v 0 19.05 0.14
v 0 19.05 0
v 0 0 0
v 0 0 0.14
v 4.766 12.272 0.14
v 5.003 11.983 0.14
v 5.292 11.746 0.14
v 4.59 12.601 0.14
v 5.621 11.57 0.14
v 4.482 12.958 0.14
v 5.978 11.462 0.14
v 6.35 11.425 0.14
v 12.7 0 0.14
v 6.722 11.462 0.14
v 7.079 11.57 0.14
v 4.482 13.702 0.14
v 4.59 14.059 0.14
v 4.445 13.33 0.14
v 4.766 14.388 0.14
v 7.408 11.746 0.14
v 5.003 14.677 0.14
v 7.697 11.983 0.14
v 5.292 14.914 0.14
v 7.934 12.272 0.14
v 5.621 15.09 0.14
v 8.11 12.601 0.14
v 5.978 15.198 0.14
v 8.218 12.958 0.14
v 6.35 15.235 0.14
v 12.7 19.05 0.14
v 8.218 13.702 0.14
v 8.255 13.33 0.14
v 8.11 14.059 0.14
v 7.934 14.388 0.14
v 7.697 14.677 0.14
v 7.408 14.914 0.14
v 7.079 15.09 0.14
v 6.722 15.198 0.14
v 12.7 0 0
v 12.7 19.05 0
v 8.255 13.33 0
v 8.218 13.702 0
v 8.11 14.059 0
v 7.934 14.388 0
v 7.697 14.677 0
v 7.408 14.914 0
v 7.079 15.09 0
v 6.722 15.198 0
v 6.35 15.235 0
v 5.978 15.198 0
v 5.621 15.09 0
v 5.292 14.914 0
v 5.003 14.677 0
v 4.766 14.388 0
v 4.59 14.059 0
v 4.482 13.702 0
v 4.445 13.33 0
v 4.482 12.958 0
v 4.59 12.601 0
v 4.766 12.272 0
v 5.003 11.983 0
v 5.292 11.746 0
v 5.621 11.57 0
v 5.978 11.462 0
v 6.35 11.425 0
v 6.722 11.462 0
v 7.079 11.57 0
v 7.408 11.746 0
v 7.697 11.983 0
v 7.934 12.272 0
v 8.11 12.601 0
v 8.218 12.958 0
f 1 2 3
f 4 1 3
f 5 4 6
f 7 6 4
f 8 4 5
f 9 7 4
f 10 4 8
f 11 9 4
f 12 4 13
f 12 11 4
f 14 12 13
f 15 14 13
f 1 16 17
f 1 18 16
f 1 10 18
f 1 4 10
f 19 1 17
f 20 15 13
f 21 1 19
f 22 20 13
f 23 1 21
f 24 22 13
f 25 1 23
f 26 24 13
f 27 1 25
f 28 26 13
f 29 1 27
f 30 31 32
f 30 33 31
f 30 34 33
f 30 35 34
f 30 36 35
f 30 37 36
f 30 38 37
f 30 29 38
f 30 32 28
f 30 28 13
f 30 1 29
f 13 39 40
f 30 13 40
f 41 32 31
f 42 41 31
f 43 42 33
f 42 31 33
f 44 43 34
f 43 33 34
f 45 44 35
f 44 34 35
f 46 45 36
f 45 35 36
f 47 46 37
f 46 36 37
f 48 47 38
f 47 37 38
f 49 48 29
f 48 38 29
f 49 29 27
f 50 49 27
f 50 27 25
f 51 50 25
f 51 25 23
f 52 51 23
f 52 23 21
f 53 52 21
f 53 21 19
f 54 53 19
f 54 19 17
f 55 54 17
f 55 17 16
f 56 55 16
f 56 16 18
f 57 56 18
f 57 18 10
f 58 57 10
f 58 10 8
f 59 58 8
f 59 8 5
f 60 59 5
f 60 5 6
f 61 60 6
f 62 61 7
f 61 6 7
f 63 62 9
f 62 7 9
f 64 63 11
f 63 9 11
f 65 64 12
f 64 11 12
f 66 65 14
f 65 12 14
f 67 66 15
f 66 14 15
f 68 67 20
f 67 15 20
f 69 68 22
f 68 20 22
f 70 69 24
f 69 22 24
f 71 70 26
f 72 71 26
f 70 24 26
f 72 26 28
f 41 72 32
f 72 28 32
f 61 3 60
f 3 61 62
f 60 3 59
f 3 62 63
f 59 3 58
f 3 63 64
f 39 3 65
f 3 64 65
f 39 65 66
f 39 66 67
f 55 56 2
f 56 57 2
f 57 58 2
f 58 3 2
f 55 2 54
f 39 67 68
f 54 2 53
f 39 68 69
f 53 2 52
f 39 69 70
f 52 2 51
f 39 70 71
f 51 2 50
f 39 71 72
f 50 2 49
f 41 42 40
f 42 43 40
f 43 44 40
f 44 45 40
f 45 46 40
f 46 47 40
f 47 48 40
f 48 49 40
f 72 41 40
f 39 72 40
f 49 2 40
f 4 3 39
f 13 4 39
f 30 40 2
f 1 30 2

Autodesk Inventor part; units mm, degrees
ref_plane "YZ Plane" through (0, 0, 0) normal (1, 0, 0) x (0, 1, 0)
ref_plane "XZ Plane" through (0, 0, 0) normal (0, 1, 0) x (-1, 0, 0)
ref_plane "XY Plane" through (0, 0, 0) normal (0, 0, 1) x (1, 0, 0)
sketch "Sketch1" plane through (0, 0, 0) normal (0, 0, 1) x (1, 0, 0)
  line L0 (0, 0) -> (12.7, 0)
  line L1 (12.7, 0) -> (12.7, 19.05)
  line L2 (12.7, 19.05) -> (0, 19.05)
  line L3 (0, 19.05) -> (0, 0)
  dimension "d0" = 19.05
  dimension "d1" = 12.7
extrude "Extrusion1" add sketch "Sketch1" along normal blind 0.1397
sketch "Sketch2" plane through (0, 0, 0.1397) normal (0, 0, 1) x (1, 0, 0)
  circle A0 centre (6.35, 13.3299) radius 1.905
  line L0 (12.7, 0) -> (12.7, 19.05) projected
  line L1 (12.7, 19.05) -> (0, 19.05) projected
  point P0 (0, 0)
  dimension "d4" = 6.35
  dimension "d5" = 5.7201
  dimension "d6" = 3.81
extrude "Extrusion2" cut sketch "Sketch2" against normal blind 0.1397
properties part number "TO220 Thermal Film"
